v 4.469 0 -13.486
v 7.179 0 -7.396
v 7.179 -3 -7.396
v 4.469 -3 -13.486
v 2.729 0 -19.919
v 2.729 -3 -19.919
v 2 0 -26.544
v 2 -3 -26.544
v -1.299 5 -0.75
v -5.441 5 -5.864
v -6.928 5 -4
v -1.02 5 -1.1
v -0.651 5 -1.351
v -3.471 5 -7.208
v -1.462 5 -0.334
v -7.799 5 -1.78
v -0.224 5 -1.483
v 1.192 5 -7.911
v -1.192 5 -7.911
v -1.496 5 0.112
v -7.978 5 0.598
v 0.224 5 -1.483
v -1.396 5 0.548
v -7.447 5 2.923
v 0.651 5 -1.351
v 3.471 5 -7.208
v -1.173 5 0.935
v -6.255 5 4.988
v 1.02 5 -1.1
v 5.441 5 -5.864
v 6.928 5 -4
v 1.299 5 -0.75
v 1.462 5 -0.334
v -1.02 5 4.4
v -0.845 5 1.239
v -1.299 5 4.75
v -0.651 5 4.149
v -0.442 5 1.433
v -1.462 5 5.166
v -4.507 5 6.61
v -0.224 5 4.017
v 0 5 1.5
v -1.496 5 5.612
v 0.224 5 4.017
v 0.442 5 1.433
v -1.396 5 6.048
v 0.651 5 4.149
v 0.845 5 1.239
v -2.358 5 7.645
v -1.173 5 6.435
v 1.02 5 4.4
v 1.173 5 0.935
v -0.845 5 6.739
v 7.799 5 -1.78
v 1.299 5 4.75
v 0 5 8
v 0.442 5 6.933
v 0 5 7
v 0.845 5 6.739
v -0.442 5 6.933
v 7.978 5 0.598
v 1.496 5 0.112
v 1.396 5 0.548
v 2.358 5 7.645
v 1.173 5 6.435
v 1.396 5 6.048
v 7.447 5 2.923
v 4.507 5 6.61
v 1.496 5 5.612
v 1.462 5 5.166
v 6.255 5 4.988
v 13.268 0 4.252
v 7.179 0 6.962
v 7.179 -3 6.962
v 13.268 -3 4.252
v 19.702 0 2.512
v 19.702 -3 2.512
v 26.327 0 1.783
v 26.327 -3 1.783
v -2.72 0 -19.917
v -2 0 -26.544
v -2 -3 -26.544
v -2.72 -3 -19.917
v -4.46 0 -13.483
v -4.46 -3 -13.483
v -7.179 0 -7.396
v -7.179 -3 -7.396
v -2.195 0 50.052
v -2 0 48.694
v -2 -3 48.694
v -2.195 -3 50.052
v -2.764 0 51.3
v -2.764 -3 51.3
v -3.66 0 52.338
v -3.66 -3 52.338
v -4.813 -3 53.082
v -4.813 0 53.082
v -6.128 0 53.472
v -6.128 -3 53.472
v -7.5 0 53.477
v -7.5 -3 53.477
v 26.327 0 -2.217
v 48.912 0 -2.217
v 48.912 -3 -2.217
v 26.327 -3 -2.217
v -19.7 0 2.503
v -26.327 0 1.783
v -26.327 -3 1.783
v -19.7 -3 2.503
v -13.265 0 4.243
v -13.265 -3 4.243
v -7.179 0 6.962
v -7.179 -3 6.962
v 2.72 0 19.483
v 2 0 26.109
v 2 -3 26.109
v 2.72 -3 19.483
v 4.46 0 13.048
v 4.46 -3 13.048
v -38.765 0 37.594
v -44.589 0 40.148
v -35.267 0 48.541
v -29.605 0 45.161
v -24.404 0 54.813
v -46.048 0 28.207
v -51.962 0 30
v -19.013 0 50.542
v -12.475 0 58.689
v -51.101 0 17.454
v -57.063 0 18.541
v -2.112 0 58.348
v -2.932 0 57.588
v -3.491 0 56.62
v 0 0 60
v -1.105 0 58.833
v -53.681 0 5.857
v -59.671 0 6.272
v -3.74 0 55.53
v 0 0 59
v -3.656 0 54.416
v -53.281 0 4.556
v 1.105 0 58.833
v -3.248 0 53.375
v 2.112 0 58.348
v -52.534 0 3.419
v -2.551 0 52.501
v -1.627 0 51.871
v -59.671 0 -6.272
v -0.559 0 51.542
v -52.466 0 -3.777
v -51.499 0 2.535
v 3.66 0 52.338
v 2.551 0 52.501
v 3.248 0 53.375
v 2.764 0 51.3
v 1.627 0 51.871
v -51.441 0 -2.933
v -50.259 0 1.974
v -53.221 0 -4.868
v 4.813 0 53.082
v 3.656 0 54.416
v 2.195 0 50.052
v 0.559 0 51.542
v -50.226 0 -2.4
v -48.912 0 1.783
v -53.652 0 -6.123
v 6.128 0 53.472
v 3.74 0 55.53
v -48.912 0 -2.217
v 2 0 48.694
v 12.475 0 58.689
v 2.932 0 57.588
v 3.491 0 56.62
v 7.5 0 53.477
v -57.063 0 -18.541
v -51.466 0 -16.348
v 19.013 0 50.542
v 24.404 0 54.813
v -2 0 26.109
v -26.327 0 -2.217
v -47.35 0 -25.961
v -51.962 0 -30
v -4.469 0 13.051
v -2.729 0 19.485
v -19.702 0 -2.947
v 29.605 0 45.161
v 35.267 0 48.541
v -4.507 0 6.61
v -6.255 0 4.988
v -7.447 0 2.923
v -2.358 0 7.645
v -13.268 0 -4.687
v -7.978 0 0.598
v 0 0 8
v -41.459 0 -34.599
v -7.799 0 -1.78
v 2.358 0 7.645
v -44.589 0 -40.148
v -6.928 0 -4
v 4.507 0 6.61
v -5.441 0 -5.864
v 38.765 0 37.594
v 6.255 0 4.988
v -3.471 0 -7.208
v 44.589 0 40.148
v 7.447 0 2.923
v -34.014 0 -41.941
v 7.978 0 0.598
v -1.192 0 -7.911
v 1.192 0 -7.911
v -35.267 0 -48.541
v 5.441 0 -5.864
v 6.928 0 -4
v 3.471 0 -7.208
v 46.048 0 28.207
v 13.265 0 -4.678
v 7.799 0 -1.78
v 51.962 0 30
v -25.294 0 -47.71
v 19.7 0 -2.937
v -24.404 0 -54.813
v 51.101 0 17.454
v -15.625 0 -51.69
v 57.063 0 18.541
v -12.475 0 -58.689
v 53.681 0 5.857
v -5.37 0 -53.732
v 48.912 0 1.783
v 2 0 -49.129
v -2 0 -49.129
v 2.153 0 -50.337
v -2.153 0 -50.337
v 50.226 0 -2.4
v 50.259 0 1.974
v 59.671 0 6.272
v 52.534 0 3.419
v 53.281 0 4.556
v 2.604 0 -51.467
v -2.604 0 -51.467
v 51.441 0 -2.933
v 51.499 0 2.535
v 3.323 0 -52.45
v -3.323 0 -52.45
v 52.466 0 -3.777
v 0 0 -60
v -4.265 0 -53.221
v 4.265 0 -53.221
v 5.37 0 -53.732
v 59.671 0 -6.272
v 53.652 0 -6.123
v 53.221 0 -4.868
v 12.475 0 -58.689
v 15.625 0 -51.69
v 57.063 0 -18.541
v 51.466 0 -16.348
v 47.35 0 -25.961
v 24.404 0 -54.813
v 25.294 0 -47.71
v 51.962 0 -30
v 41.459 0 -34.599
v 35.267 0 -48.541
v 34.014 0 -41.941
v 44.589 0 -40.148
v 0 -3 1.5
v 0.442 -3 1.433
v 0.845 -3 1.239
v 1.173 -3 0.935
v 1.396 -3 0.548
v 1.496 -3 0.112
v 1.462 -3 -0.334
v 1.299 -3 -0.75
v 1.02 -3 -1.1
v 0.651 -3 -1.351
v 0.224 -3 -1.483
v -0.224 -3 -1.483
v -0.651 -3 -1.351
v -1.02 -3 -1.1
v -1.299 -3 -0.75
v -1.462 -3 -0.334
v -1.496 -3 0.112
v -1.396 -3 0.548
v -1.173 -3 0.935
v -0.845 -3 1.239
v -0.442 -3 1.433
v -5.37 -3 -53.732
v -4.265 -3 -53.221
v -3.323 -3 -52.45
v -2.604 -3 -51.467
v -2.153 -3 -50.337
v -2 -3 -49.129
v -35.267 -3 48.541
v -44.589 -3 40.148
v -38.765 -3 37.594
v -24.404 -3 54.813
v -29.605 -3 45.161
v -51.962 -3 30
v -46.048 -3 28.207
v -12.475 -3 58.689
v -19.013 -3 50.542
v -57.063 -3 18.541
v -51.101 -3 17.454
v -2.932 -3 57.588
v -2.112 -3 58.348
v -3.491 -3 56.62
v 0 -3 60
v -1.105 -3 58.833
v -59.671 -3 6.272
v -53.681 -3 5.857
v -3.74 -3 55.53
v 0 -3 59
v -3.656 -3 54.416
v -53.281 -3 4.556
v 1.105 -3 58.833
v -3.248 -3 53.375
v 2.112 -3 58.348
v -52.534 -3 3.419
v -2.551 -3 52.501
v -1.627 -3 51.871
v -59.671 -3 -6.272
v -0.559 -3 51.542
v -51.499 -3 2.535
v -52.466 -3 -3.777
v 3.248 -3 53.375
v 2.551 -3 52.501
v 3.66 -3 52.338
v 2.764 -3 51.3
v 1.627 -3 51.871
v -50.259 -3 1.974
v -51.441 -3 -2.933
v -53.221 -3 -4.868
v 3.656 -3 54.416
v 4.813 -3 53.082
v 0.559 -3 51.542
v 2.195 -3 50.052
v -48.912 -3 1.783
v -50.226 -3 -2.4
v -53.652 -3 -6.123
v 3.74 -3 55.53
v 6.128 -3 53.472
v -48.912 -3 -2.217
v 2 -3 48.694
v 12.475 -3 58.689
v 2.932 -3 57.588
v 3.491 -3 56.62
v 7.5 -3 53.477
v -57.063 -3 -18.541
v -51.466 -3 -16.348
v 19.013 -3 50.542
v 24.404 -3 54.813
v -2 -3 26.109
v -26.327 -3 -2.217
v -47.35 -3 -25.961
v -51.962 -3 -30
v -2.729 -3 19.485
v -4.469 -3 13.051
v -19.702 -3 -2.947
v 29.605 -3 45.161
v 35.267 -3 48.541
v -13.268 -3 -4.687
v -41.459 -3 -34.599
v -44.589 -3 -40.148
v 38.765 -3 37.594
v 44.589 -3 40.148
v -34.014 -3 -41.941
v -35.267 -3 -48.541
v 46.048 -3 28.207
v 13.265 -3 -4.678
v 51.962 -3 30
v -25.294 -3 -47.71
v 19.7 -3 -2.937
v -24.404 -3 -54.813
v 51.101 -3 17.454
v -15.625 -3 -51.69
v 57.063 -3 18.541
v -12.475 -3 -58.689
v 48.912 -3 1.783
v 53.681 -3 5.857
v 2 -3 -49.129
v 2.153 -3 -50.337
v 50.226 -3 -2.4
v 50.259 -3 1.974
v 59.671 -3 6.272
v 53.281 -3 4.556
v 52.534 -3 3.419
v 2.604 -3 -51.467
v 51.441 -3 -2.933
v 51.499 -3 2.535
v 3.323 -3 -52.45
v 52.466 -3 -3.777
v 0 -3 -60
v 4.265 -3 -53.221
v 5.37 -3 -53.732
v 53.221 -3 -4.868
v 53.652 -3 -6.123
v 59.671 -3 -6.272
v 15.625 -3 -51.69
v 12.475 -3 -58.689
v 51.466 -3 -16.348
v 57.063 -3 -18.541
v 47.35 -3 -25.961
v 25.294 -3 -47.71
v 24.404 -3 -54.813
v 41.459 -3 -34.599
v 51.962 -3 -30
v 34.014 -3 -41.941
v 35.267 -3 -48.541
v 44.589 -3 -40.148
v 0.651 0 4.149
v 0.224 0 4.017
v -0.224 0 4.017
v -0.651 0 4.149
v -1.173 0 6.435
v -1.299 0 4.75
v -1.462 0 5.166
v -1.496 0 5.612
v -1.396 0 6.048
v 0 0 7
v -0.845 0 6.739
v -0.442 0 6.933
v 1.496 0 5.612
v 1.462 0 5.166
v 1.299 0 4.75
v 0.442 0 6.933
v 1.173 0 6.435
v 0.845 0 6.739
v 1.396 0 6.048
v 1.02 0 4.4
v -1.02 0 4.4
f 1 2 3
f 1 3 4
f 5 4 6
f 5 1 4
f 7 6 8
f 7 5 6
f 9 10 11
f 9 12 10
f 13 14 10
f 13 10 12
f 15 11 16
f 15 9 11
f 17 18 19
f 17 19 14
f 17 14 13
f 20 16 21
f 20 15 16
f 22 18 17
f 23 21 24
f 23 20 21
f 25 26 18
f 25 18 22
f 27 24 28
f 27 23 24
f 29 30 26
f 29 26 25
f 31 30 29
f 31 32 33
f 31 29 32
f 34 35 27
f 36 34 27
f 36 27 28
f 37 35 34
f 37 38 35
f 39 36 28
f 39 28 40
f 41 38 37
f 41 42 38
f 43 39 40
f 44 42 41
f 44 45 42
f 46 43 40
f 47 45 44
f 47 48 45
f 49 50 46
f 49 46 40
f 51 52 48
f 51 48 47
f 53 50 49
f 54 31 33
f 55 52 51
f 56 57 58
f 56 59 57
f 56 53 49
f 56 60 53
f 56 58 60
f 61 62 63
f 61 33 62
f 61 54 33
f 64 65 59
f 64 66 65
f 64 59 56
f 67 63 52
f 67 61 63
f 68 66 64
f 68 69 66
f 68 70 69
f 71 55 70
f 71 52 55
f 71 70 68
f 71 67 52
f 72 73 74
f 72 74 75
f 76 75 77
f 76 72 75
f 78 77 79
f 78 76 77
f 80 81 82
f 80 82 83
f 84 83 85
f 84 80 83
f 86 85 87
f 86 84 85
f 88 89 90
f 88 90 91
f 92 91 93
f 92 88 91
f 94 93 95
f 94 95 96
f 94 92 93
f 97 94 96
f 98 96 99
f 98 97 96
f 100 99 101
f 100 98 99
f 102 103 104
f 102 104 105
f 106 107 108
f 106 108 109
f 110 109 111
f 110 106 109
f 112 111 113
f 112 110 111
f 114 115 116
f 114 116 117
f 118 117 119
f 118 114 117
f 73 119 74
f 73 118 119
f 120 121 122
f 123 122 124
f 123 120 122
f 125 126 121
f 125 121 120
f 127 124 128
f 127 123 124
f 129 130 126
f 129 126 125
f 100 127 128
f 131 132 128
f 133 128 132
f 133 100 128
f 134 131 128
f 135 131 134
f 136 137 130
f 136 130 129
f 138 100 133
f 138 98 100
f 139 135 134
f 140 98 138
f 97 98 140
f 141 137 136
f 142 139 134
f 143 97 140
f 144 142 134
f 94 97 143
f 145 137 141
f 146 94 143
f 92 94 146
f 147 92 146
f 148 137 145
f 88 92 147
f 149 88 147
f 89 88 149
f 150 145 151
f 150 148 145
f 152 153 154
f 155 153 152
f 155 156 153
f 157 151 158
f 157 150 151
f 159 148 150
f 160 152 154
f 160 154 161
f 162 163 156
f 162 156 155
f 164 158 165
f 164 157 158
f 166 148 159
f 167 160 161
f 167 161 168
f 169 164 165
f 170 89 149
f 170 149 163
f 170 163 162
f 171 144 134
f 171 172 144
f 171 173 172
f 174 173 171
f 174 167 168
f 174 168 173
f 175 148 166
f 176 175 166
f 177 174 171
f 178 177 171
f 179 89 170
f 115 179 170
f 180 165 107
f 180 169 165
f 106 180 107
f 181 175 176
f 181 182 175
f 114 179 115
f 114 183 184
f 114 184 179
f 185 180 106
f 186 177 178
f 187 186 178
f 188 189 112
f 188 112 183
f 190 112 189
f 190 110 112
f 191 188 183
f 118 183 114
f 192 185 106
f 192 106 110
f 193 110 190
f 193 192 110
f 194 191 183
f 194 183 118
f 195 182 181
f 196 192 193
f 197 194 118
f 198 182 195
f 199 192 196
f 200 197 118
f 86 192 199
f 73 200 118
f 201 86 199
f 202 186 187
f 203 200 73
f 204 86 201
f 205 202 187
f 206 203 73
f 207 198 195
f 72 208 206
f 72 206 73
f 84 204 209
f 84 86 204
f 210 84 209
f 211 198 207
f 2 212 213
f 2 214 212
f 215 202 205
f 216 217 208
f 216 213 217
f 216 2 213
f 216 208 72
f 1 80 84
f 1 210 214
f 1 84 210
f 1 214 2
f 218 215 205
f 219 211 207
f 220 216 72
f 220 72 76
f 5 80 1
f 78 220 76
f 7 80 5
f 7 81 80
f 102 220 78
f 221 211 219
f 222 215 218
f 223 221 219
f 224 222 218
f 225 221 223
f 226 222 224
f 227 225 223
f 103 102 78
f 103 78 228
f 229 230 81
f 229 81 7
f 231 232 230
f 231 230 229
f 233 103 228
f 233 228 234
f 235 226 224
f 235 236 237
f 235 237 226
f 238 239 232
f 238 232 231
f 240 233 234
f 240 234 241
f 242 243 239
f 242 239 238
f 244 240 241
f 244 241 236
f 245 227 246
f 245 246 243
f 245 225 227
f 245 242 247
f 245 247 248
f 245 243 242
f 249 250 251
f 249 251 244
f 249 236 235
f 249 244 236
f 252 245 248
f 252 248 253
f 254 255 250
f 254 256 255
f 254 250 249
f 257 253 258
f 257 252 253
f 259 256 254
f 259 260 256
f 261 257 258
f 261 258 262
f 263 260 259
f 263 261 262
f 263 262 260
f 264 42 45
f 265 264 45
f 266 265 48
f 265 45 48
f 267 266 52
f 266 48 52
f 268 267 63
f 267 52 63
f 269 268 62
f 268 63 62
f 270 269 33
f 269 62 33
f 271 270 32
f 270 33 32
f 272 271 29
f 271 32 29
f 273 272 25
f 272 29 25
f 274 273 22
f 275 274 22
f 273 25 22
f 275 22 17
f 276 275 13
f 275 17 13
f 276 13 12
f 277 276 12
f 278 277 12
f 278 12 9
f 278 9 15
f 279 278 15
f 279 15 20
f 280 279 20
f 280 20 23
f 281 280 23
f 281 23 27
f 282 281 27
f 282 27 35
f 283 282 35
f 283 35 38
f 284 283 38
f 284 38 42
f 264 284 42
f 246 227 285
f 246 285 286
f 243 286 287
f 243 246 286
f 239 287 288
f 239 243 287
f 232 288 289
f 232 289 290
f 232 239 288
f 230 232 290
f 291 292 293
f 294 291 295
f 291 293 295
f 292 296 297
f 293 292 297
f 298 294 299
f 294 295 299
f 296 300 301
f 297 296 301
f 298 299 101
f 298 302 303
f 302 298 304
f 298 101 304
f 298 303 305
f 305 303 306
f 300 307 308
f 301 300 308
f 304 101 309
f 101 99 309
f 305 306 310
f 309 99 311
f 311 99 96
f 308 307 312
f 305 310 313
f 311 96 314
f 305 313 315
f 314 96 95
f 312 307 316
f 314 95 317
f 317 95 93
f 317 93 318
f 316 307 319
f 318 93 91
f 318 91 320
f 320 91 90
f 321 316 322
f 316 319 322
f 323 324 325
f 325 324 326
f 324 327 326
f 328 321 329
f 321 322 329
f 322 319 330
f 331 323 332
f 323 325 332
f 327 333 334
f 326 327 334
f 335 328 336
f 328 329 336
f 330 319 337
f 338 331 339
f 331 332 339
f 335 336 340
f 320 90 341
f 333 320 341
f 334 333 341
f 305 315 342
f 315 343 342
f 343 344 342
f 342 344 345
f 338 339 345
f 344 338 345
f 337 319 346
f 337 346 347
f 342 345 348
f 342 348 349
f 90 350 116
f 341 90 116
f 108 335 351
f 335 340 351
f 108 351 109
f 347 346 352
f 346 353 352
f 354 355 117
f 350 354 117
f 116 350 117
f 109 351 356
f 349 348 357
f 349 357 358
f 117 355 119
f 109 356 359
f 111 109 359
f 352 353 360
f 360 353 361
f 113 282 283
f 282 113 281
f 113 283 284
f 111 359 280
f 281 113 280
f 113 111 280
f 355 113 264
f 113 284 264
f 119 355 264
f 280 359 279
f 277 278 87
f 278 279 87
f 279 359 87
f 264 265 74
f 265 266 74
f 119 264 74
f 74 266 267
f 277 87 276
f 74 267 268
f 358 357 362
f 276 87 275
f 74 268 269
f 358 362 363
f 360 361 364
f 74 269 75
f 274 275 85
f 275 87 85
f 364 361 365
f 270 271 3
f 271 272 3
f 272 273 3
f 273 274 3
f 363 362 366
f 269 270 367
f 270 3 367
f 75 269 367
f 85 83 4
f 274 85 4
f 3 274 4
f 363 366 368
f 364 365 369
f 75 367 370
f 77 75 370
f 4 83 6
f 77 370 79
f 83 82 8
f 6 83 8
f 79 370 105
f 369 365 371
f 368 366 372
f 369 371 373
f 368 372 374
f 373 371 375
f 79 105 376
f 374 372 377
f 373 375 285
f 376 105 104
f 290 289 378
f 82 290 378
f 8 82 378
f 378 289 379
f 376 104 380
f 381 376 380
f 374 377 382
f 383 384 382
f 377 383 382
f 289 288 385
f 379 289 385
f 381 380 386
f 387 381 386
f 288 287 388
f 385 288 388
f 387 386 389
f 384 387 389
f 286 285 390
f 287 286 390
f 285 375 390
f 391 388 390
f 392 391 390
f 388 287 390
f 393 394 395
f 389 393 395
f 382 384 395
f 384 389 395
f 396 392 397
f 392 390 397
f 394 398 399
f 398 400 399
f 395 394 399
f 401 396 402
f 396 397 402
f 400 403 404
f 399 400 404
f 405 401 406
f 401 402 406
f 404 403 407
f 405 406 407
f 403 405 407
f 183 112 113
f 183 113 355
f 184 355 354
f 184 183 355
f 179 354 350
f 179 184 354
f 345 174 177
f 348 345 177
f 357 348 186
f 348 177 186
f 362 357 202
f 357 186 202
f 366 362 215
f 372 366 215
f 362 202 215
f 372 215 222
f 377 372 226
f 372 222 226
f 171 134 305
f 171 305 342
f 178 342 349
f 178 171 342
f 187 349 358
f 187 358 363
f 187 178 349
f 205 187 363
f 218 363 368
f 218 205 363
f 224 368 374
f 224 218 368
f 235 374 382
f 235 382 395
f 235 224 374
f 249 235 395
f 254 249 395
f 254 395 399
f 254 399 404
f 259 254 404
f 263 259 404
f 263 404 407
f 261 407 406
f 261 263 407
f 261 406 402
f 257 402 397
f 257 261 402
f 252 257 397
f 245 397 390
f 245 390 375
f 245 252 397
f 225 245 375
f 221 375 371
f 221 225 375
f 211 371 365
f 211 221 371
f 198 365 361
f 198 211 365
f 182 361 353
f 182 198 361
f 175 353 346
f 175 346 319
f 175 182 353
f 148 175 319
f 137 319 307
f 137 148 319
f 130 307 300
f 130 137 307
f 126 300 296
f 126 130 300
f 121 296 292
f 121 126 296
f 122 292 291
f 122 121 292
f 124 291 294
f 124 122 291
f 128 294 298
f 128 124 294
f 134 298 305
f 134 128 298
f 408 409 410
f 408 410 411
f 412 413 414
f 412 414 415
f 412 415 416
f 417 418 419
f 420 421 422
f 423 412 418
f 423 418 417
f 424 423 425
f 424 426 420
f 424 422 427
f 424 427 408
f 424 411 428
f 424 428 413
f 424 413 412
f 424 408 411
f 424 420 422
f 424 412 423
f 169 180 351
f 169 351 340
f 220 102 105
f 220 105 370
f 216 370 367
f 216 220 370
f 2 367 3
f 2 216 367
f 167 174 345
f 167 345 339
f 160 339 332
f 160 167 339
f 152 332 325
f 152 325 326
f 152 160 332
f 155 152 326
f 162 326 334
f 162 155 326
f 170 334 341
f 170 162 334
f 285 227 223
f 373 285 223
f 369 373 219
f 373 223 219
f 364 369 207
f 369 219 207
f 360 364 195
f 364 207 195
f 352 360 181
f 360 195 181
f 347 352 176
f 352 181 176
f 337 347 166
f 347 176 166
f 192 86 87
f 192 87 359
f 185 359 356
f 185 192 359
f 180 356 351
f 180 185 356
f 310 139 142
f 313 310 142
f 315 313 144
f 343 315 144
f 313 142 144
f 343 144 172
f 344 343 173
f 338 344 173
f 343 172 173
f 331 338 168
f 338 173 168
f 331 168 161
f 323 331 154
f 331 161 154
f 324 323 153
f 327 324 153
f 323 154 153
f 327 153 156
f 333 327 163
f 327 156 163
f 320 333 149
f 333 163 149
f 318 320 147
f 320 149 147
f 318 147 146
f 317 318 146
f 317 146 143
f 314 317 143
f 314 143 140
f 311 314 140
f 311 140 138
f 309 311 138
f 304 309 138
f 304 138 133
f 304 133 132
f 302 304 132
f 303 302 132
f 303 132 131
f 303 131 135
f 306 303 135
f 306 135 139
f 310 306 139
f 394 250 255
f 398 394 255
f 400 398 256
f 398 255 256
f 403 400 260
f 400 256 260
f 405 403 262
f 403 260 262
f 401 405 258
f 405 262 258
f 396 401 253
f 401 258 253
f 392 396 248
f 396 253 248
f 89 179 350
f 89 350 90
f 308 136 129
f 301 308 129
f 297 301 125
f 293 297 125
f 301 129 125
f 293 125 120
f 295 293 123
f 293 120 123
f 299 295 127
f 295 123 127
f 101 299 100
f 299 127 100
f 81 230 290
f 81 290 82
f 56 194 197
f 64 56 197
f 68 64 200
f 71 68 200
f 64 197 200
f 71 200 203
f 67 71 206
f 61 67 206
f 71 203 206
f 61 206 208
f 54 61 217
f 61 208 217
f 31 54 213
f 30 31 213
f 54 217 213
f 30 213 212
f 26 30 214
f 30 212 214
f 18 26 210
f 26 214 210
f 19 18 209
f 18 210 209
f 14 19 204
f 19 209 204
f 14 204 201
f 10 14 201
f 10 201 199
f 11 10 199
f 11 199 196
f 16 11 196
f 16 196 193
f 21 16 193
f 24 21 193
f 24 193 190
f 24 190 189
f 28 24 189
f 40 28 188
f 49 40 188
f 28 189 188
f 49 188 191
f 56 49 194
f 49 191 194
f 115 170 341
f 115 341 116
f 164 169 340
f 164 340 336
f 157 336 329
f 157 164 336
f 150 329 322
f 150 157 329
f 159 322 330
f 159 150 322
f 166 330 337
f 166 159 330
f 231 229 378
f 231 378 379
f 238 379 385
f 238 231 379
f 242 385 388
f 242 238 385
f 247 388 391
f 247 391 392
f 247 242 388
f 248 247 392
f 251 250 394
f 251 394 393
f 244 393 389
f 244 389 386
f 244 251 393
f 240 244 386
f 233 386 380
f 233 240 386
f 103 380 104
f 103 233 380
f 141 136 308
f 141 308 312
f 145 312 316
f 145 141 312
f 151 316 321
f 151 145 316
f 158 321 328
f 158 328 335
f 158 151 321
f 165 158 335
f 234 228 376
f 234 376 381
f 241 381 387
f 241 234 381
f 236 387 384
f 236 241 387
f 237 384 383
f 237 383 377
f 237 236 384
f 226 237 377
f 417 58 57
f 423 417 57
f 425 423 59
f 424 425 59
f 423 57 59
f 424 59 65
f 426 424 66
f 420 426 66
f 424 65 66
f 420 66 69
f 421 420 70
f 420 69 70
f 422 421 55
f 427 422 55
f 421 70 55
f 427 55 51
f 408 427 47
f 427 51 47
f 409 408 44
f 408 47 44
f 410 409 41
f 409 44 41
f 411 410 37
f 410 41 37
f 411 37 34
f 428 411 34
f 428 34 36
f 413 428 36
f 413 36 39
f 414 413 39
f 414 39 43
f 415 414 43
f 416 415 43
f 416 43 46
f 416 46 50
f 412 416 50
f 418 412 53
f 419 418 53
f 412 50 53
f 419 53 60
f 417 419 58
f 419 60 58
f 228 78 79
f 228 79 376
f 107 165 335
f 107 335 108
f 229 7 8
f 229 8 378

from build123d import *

# Parameters (mm, degrees)
SKETCH1_R           = 60
SKETCH1_R_2         = 54
SKETCH1_R_3         = 8
BOSS_EXTRUDE1_DEPTH = 3
SKETCH1_3_R         = 8
BOSS_EXTRUDE2_DEPTH = 5
CUT_EXTRUDE1_REACH  = 87.229
SKETCH2_R           = 1.5
CUT_EXTRUDE2_REACH  = 87
SKETCH3_R           = 3.75
SKETCH4_R           = 1.5
CUT_EXTRUDE3_DEPTH  = 5


with BuildPart() as part:
    # Sketch1 → Boss-Extrude1 (new body)
    # profile 1 of 3: a face of its own
    with BuildSketch(Plane(origin=(0, 0, 0), x_dir=(1, 0, 0), z_dir=(0, 1, 0))):
        with Locations(Location((0, 0, 0), (0, 0, 270))):
            Circle(SKETCH1_R)
        Circle(SKETCH1_R_2, mode=Mode.SUBTRACT)
    # profile 2 of 3: a face of its own
    with BuildSketch(Plane(origin=(0, 0, 0), x_dir=(1, 0, 0), z_dir=(0, 1, 0))):
        with BuildLine():
            ThreePointArc((7.5, -53.47663041), (3.660460389, -52.338407931), (2.000000204, -48.694167705))
            Line((2.000000204, -48.694167705), (2.000000204, -26.109482291))
            ThreePointArc((2.000000204, -26.109482291), (3.464837403, -16.231345149), (7.178910038, -6.961555191))
            ThreePointArc((7.178910038, -6.961555191), (16.451417639, -3.257530466), (26.326837138, -1.782645358))
            Line((26.326837138, -1.782645358), (48.911522552, -1.782645358))
            ThreePointArc((48.911522552, -1.782645358), (52.048100377, -2.939896306), (53.681424467, -5.857018624))
            ThreePointArc((53.681424467, -5.857018624), (53.920297297, -2.93283811), (54, 0))
            ThreePointArc((54, 0), (53.912855321, 3.066599276), (53.651702551, 6.123300855))
            ThreePointArc((53.651702551, 6.123300855), (51.982585847, 3.31964037), (48.911522552, 2.217355051))
            Line((48.911522552, 2.217355051), (26.326837138, 2.217355051))
            ThreePointArc((26.326837138, 2.217355051), (16.448699996, 3.682192249), (7.178910038, 7.396264884))
            ThreePointArc((7.178910038, 7.396264884), (3.474885313, 16.668772485), (2.000000204, 26.544191985))
            Line((2.000000204, 26.544191985), (2.000000204, 49.128877399))
            ThreePointArc((2.000000204, 49.128877399), (2.932488129, 51.981408674), (5.369841962, 53.732344052))
            ThreePointArc((5.369841962, 53.732344052), (0, 54), (-5.369841962, 53.732344052))
            ThreePointArc((-5.369841962, 53.732344052), (-2.932488129, 51.981408674), (-2.000000204, 49.128877399))
            Line((-2.000000204, 49.128877399), (-2.000000204, 26.544191985))
            ThreePointArc((-2.000000204, 26.544191985), (-3.464837403, 16.666054843), (-7.178910038, 7.396264884))
            ThreePointArc((-7.178910038, 7.396264884), (-16.451417639, 3.69224016), (-26.326837138, 2.217355051))
            Line((-26.326837138, 2.217355051), (-48.911522552, 2.217355051))
            ThreePointArc((-48.911522552, 2.217355051), (-51.982585847, 3.31964037), (-53.651702551, 6.123300855))
            ThreePointArc((-53.651702551, 6.123300855), (-53.99983382, 0.133967924), (-53.681424467, -5.857018624))
            ThreePointArc((-53.681424467, -5.857018624), (-52.048100377, -2.939896306), (-48.911522552, -1.782645358))
            Line((-48.911522552, -1.782645358), (-26.326837138, -1.782645358))
            ThreePointArc((-26.326837138, -1.782645358), (-16.448699996, -3.247482556), (-7.178910038, -6.961555191))
            ThreePointArc((-7.178910038, -6.961555191), (-3.474885313, -16.234062792), (-2.000000204, -26.109482291))
            Line((-2.000000204, -26.109482291), (-2.000000204, -48.694167705))
            ThreePointArc((-2.000000204, -48.694167705), (-3.660460389, -52.338407931), (-7.5, -53.47663041))
            ThreePointArc((-7.5, -53.47663041), (0, -54), (7.5, -53.47663041))
        make_face()
        Circle(SKETCH1_R_3, mode=Mode.SUBTRACT)
    # profile 3 of 3: a face of its own
    with BuildSketch(Plane(origin=(0, 0, 0), x_dir=(1, 0, 0), z_dir=(0, 1, 0))):
        Circle(SKETCH1_R_3)
    extrude(amount=-BOSS_EXTRUDE1_DEPTH)

    # Sketch1<3> → Boss-Extrude2 (add)
    with BuildSketch(Plane(origin=(0, 0, 0), x_dir=(1, 0, 0), z_dir=(0, 1, 0))):
        with Locations(Location((0, 0, 0), (0, 0, 270))):
            Circle(SKETCH1_3_R)
    extrude(amount=BOSS_EXTRUDE2_DEPTH)

    # Sketch2 → Cut-Extrude1 (cut, up to next)
    with BuildSketch(Plane(origin=(0, 5, 0), x_dir=(1, 0, 0), z_dir=(0, 1, 0)), mode=Mode.PRIVATE) as cut_extrude1_sk1:
        with Locations(Location((0, 0, 0), (0, 0, 270))):
            Circle(SKETCH2_R)
    cut_extrude1_tool1 = extrude(cut_extrude1_sk1.sketch, amount=-CUT_EXTRUDE1_REACH, mode=Mode.PRIVATE) & part.part
    add(cut_extrude1_tool1.solids().sort_by_distance((0, 5, 0))[0], mode=Mode.SUBTRACT)

    # Sketch3 → Cut-Extrude2 (cut, up to next)
    with BuildSketch(Plane(origin=(0, 0, 0), x_dir=(1, 0, 0), z_dir=(0, 1, 0)), mode=Mode.PRIVATE) as cut_extrude2_sk1:
        with Locations(Location((0, -55.25, 0), (0, 0, 270))):
            Circle(SKETCH3_R)
    cut_extrude2_tool1 = extrude(cut_extrude2_sk1.sketch, amount=-CUT_EXTRUDE2_REACH, mode=Mode.PRIVATE) & part.part
    add(cut_extrude2_tool1.solids().sort_by_distance((0, 0, 55.25))[0], mode=Mode.SUBTRACT)

    # Sketch4 → Cut-Extrude3 (cut)
    with BuildSketch(Plane(origin=(0, 5, 0), x_dir=(1, 0, 0), z_dir=(0, 1, 0))):
        with Locations(Location((0, -5.5, 0), (0, 0, 270))):
            Circle(SKETCH4_R)
    extrude(amount=-CUT_EXTRUDE3_DEPTH, mode=Mode.SUBTRACT)


solid = part.part
